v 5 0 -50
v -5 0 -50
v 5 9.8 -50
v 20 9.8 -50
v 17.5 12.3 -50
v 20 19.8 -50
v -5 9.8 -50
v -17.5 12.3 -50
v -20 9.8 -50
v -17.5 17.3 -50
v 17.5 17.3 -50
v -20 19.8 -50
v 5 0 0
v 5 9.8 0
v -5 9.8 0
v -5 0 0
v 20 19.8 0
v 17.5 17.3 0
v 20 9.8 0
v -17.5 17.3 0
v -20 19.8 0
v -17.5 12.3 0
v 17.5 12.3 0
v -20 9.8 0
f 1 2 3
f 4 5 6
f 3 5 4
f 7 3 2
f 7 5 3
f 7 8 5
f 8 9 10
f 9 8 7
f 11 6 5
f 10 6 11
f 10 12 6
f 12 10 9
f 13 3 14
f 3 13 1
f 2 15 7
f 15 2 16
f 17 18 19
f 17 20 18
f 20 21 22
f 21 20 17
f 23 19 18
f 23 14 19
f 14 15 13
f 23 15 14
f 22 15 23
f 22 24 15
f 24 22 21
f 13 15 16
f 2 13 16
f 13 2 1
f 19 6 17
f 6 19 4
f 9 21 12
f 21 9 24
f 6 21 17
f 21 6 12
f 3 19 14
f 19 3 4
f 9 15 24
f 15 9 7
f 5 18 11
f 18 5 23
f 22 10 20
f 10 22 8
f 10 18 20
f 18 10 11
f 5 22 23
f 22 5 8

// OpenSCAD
/*[Blade generator for sandpaper handler]*/

// Length of the blade:
BladeLength = 10;
// Radius for cylindrical blade (minimum 8):
BladeRadius = 16;
// Height for Ortho blade (minimum 10):
BladeHeight = 40;
// Hollow:
Hollow = 1; // [0:Fill, 1:Hollow]

// End type:
EndType=5; // [1:Round, 2:Chamfer, 3:Flat, 4:Cylindrical, 5:Ortho]

module MakeBlade()
{
    if (EndType==1)
        rotate([90,0,0])
        union()
        {
        cube([10,50,BladeLength]);
        translate([5,0,BladeLength])
            rotate([-90,0,0])
                cylinder(h=50,r=5,$fn=100);
        }
        
    if (EndType==2)
        rotate([0,90,180])
        difference()
        {
        cube([10,50,BladeLength]);
        translate([-10,-5,BladeLength-6])
            rotate([0,45,0])
                cube([10,60,20]);
        }

    if (EndType==3)
        cube([50,BladeLength,10]);

    if (EndType==4)
        rotate([0,90,0])
        difference()
        {
            union()
            {
            translate([0,0,-5])
                cube([50,12,10]);
            translate([0,BladeRadius+9,0])
                rotate([0,90,0])
                cylinder(h=50,r=BladeRadius,$fn=100);
                
            }
        if(Hollow>0)
        translate([-5,BladeRadius+9,0])
            rotate([0,90,0])
            cylinder(h=60,r=BladeRadius-4,$fn=100);
            
        }

    if (EndType==5)
        rotate([0,90,0])
        difference()
        {
            union()
            {
            translate([0,0,-5])
                cube([50,10,10]);
            translate([0,9.8,-BladeHeight/2])
                cube([50,BladeLength,BladeHeight]);
            }
        if(Hollow>0)
            translate([-5,9.8+(BladeLength-(BladeLength-5))/2,-(BladeHeight-5)/2])
                cube([60,BladeLength-5,BladeHeight-5]);
        }
}

// Main
MakeBlade();
